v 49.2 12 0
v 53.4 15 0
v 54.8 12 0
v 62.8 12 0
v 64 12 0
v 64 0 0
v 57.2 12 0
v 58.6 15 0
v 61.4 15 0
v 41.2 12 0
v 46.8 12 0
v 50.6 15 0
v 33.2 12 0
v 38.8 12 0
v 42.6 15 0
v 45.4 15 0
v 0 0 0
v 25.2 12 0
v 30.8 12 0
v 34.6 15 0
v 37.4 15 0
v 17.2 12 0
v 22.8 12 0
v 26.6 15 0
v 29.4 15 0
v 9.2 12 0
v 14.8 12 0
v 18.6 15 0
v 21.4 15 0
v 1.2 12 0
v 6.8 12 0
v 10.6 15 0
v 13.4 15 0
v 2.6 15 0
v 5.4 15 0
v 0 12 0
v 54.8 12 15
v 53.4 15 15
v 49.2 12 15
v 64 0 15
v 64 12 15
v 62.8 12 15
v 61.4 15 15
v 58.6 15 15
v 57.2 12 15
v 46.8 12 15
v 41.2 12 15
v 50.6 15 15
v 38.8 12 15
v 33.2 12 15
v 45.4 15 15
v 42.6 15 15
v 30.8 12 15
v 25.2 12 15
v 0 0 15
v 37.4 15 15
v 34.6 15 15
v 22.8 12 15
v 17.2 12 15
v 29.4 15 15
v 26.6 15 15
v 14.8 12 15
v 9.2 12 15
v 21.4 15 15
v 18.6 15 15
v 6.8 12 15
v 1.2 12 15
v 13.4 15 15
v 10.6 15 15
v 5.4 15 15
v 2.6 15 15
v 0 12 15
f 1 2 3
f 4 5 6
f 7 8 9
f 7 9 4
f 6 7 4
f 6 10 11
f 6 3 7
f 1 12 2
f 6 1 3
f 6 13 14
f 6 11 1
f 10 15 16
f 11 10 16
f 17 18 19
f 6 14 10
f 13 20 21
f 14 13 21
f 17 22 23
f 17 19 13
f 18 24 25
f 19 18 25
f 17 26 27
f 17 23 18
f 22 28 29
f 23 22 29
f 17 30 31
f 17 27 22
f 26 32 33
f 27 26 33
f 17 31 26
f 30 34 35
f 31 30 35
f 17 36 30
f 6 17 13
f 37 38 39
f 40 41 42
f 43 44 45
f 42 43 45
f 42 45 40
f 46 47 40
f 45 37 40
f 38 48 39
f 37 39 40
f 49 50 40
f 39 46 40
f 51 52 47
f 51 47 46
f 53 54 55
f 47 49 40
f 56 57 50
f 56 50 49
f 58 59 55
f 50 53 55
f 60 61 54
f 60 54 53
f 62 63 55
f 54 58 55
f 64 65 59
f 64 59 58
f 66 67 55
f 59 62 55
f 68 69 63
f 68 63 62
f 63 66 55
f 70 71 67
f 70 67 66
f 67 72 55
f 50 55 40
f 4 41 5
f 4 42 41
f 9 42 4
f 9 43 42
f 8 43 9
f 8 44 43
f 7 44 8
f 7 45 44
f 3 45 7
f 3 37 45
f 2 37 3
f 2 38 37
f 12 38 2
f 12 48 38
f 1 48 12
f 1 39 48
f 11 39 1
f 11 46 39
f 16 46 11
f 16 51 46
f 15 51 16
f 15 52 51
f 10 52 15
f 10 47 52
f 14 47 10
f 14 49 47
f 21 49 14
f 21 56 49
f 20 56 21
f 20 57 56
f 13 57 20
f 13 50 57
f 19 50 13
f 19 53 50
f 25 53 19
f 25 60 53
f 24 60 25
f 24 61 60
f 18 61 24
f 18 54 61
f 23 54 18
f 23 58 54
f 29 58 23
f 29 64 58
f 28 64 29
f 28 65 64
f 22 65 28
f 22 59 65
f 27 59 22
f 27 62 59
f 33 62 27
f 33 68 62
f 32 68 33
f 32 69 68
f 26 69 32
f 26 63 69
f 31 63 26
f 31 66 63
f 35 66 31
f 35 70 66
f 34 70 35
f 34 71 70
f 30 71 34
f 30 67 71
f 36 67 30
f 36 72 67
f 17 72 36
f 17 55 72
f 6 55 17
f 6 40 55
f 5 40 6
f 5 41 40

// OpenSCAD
$fn = 32;

// ----------------------------------------------------------------------
// Gear rack: 8 teeth, pitch 8 mm
// ----------------------------------------------------------------------

// --- parameters (mm) ---
teeth = 8;                // number of teeth
pitch = 8;                // tooth pitch, X
root_w = 5.6;             // tooth width at the root
tip_w = 2.8;              // tooth width at the tip
base_h = 12;              // rack body height, Y
tooth_h = 3;              // tooth height above the body
plate_t = 15;             // rack width, Z (extrusion height)

rack_l = teeth * pitch;  // overall length
total_h = base_h + tooth_h;  // overall height

profile = [[0, 0], [64, 0], [64, 12], [62.8, 12], [61.4, 15], [58.6, 15], [57.2, 12], [54.8, 12], [53.4, 15], [50.6, 15], [49.2, 12], [46.8, 12], [45.4, 15], [42.6, 15], [41.2, 12], [38.8, 12], [37.4, 15], [34.6, 15], [33.2, 12], [30.8, 12], [29.4, 15], [26.6, 15], [25.2, 12], [22.8, 12], [21.4, 15], [18.6, 15], [17.2, 12], [14.8, 12], [13.4, 15], [10.6, 15], [9.2, 12], [6.8, 12], [5.4, 15], [2.6, 15], [1.2, 12], [0, 12]];  // primary outline, 36 points, counter clockwise

// --- the one profile operation ---
linear_extrude(height = plate_t) polygon(points = profile);
